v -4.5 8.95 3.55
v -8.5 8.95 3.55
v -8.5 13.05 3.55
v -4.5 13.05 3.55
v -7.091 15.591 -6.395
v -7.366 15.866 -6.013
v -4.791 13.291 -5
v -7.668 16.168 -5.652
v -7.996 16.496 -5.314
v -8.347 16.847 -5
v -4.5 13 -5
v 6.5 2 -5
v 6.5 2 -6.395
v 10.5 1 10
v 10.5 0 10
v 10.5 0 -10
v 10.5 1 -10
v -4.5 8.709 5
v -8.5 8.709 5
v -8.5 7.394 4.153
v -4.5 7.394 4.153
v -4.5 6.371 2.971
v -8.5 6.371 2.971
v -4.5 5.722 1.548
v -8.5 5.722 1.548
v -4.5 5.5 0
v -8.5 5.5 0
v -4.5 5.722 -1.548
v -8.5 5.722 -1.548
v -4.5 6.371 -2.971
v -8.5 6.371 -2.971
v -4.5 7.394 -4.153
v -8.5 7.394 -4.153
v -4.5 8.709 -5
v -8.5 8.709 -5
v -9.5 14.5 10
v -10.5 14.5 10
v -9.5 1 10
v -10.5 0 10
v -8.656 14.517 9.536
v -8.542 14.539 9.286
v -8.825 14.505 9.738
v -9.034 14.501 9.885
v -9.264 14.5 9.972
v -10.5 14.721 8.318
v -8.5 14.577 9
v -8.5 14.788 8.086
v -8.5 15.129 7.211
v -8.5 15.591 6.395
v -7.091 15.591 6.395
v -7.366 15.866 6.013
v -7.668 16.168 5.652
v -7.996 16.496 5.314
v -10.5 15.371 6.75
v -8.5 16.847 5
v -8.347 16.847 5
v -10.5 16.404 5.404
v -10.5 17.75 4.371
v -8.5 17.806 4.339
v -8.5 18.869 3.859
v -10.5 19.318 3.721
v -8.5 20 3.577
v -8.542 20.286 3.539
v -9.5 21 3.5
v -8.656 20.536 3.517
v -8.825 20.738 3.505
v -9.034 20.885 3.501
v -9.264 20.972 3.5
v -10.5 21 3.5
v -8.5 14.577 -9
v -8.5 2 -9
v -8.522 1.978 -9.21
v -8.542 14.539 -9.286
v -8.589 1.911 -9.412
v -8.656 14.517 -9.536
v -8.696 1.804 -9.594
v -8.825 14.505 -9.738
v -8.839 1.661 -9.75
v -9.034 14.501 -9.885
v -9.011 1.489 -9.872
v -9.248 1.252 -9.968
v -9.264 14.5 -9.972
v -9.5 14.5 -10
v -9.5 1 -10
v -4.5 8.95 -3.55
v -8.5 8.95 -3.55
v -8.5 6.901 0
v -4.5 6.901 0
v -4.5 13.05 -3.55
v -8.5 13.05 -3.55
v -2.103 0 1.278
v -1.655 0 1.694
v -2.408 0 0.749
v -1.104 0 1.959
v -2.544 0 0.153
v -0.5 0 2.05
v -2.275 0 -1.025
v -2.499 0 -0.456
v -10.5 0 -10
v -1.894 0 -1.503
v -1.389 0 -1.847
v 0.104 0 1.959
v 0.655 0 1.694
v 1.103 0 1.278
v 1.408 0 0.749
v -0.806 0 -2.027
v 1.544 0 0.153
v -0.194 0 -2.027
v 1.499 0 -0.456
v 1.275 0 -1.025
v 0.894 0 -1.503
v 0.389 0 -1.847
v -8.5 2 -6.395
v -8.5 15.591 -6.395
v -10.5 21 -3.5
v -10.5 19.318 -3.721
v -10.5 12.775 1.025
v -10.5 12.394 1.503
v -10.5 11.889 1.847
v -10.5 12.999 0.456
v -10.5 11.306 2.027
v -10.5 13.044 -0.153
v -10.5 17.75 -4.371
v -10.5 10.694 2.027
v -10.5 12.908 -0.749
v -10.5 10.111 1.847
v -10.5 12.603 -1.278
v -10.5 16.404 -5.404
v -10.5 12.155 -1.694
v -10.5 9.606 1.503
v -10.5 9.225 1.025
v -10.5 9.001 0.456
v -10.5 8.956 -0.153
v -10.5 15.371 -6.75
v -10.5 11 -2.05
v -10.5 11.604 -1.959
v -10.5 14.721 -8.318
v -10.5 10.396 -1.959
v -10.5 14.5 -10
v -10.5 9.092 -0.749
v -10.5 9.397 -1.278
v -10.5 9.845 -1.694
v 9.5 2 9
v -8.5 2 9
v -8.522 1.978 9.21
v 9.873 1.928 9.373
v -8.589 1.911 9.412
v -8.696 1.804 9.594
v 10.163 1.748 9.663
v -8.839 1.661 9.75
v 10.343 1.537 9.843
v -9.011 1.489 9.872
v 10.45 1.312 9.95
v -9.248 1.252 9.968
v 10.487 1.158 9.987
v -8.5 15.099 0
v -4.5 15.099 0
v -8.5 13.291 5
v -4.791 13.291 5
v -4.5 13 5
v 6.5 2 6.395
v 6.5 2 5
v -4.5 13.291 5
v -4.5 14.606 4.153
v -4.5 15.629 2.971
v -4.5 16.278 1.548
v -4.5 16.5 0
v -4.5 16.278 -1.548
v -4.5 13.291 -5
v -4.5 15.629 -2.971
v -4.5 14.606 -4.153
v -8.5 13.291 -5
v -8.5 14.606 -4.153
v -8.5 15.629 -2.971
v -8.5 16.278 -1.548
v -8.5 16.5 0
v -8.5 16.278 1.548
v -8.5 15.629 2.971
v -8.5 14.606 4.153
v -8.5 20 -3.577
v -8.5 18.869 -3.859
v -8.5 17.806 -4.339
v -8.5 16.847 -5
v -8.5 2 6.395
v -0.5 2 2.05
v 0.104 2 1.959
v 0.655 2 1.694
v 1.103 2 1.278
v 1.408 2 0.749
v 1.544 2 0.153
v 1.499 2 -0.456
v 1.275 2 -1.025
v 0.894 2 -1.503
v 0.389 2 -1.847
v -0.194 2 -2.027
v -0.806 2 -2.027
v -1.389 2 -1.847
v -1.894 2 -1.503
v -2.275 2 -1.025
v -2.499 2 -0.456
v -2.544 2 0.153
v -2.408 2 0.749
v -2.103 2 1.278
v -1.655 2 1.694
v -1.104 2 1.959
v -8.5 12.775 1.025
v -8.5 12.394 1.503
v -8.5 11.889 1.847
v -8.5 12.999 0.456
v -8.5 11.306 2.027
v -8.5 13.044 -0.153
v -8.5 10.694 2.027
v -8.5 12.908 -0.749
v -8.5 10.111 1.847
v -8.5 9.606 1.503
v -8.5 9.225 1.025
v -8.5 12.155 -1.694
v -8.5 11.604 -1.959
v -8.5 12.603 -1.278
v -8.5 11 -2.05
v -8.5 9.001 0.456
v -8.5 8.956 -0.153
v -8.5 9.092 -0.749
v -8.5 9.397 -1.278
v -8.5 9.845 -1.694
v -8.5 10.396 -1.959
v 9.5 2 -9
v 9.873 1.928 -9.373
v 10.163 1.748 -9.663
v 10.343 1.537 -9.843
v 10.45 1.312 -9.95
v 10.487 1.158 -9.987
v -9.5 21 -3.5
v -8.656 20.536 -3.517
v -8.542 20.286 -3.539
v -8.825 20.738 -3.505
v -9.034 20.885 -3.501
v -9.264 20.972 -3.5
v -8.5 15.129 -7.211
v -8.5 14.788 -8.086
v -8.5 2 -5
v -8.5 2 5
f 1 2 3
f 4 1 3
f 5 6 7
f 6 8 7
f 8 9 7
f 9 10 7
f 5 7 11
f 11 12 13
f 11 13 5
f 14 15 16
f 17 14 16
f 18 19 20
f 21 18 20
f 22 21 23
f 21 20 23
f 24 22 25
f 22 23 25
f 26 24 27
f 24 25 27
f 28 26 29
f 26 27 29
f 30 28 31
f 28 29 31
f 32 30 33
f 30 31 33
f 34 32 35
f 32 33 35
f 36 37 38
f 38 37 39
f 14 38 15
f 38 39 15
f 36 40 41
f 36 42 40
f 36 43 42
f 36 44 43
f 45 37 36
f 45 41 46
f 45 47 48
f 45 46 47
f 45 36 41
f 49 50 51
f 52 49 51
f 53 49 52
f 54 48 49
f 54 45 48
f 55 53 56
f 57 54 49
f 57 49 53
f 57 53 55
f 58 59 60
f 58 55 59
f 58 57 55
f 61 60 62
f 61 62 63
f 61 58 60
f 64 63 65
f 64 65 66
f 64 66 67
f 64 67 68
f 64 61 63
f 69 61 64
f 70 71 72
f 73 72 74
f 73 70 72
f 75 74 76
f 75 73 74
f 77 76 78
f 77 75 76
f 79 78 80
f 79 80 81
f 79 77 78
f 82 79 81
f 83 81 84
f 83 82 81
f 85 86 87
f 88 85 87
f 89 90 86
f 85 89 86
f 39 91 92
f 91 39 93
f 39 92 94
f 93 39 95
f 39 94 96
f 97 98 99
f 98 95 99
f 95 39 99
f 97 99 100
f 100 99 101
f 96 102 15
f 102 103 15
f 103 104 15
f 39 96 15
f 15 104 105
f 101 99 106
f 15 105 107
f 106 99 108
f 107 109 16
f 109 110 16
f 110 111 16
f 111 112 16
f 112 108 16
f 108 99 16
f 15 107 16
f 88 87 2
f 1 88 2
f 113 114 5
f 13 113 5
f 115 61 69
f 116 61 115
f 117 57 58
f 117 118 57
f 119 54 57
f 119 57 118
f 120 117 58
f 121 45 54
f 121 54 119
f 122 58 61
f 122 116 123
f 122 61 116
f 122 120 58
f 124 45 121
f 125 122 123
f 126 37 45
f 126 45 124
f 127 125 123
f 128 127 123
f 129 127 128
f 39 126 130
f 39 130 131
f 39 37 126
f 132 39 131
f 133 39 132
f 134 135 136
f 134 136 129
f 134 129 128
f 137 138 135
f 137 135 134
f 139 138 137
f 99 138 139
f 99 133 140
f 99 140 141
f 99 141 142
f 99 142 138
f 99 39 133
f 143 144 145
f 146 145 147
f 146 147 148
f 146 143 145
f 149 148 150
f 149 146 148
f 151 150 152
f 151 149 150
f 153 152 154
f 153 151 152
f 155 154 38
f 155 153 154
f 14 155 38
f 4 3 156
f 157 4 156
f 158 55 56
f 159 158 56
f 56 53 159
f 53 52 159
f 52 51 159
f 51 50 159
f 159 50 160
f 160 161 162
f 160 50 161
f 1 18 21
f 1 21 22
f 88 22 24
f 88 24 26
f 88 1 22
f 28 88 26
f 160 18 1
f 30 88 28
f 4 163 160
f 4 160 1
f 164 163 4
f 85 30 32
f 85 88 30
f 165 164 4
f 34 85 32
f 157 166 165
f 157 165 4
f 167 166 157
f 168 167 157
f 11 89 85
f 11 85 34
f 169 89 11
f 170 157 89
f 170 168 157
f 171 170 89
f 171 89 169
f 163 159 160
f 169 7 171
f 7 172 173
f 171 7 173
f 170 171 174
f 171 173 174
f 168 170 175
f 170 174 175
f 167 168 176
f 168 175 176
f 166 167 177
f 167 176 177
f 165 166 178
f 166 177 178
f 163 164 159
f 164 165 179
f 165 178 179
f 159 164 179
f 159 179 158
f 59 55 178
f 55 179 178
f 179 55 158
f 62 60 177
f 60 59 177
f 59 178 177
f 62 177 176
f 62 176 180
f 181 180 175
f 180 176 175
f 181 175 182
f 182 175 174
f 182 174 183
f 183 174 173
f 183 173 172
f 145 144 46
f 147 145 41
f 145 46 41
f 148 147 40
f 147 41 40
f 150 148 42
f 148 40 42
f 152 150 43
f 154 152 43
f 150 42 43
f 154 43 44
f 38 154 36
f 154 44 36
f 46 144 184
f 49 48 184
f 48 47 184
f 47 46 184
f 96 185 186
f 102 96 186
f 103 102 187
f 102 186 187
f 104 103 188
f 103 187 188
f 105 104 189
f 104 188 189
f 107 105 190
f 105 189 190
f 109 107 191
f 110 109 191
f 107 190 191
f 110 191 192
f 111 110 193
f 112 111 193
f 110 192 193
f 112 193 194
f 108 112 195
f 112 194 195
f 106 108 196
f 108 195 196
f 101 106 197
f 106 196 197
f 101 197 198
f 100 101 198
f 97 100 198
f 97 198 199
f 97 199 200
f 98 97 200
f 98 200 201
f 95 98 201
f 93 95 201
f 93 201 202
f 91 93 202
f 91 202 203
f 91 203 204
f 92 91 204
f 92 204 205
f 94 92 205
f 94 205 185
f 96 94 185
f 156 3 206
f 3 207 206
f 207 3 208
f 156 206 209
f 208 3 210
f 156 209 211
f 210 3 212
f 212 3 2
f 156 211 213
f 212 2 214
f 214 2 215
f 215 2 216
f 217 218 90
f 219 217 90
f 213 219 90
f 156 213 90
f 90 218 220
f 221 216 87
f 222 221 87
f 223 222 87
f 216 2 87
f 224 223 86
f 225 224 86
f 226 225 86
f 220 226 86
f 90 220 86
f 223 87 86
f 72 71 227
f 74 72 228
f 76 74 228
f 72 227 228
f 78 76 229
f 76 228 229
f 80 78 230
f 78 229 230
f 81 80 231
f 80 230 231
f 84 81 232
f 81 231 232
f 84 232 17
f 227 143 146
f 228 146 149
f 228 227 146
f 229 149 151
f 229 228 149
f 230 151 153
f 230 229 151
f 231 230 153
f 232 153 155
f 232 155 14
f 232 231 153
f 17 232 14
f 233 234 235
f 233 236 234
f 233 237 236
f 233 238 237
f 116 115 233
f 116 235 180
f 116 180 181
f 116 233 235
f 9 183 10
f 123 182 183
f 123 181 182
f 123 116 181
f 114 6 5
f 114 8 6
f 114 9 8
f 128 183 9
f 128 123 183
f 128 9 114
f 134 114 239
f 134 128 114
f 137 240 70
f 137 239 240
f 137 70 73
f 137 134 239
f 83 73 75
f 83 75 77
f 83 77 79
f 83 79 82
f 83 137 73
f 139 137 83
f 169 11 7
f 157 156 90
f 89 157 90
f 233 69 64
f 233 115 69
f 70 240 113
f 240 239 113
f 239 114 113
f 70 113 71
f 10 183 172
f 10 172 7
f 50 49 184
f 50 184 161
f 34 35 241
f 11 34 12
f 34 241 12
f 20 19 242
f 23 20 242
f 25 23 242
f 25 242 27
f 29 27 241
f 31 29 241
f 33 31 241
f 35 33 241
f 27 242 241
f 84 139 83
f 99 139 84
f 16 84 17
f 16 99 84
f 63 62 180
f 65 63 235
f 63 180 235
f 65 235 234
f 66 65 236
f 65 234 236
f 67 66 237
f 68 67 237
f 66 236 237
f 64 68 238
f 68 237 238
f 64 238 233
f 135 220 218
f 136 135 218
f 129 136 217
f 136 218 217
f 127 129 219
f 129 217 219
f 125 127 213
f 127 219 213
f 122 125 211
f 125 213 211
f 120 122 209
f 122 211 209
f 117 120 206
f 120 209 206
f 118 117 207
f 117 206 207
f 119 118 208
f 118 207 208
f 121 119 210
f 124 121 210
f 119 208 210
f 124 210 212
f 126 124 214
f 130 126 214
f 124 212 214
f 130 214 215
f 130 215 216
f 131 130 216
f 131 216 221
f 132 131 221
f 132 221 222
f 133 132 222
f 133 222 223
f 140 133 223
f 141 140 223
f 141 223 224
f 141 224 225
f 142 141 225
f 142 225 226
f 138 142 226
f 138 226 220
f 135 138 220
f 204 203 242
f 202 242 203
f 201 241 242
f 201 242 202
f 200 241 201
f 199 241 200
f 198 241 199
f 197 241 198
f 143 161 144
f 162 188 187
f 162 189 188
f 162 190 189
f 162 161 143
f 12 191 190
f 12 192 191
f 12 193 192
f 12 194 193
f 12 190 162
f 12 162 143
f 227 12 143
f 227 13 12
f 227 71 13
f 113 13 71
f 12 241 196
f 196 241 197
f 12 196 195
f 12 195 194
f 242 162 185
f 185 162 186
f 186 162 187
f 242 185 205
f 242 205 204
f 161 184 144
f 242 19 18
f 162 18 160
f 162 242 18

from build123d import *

# Parameters (mm, degrees)
ESQUISSE1_W                  = 21
ESQUISSE1_H                  = 20
BOSS_EXTRU_1_DEPTH           = 2
ESQUISSE2_W                  = 2
ESQUISSE2_H                  = 20
BOSS_EXTRU_2_DEPTH           = 19
ESQUISSE3_R                  = 2.05
ENL_V_MAT_EXTRU_1_DEPTH      = 20
ESQUISSE4_R                  = 2.05
ENL_V_MAT_EXTRU_2_DEPTH      = 20
ESQUISSE5_W                  = 15
ESQUISSE5_H                  = 1.39480656
BOSS_EXTRU_3_DEPTH           = 15
CHANFREIN1_SIZE              = 15
CONG_1_R                     = 1
BOSS_EXTRU_12_DEPTH          = 4
ENL_V_MAT_EXTRU_3_DEPTH      = 26.51960031
ENL_V_MAT_EXTRU_3_DEPTH_BACK = 26.51960031
ESQUISSE9_R                  = 6.5


with BuildPart() as part:
    # Esquisse1 → Boss.-Extru.1 (new body)
    with BuildSketch(Plane(origin=(0, 0, 0), x_dir=(1, 0, 0), z_dir=(0, 1, 0))):
        Rectangle(ESQUISSE1_W, ESQUISSE1_H)
    extrude(amount=BOSS_EXTRU_1_DEPTH)

    # Esquisse2 → Boss.-Extru.2 (add)
    with BuildSketch(Plane(origin=(0, 2, 0), x_dir=(1, 0, 0), z_dir=(0, 1, 0))):
        with Locations((-9.5, 0)):
            Rectangle(ESQUISSE2_W, ESQUISSE2_H)
    extrude(amount=BOSS_EXTRU_2_DEPTH)

    # Esquisse3 → Enlèv. mat.-Extru.1 (cut)
    with BuildSketch(Plane(origin=(0, 2, 0), x_dir=(1, 0, 0), z_dir=(0, 1, 0))):
        with Locations(Location((-0.5, 0, 0), (0, 0, 270))):
            Circle(ESQUISSE3_R)
    extrude(amount=-ENL_V_MAT_EXTRU_1_DEPTH, mode=Mode.SUBTRACT)

    # Esquisse4 → Enlèv. mat.-Extru.2 (cut)
    with BuildSketch(Plane(origin=(-8.5, 0, 0), x_dir=(0, 0, -1), z_dir=(1, 0, 0))):
        with Locations((0, 11)):
            Circle(ESQUISSE4_R)
    extrude(amount=-ENL_V_MAT_EXTRU_2_DEPTH, mode=Mode.SUBTRACT)

    # Esquisse5 → Boss.-Extru.3 (add)
    with BuildSketch(Plane(origin=(0, 2, 0), x_dir=(1, 0, 0), z_dir=(0, 1, 0))):
        with Locations((-1, -5.69740328)):
            Rectangle(ESQUISSE5_W, ESQUISSE5_H)
        with Locations((-1, 5.69740328)):
            Rectangle(ESQUISSE5_W, ESQUISSE5_H)
    extrude(amount=BOSS_EXTRU_3_DEPTH)

    # Chanfrein1
    chanfrein1_edges = [part.edges().sort_by_distance(p)[0] for p in [
        (6.5, 17, 5.69740328),
        (6.5, 17, -5.69740328),
    ]]
    chamfer(chanfrein1_edges, length=CHANFREIN1_SIZE - 0.0001)  # a hair under: the kernel refuses the full size

    # Congé1
    cong_1_edges = [part.edges().sort_by_distance(p)[0] for p in [
        (10.5, 2, 0),
        (1, 2, 10),
        (-8.5, 21, 0),
        (-8.5, 11.5, 10),
        (-8.5, 11.5, -10),
        (1, 2, -10),
    ]]
    fillet(cong_1_edges, radius=CONG_1_R)

    # Esquisse7 → Boss.-Extru.12 (add)
    with BuildSketch(Plane(origin=(-8.5, 0, 0), x_dir=(0, 0, -1), z_dir=(1, 0, 0))):
        with BuildLine():
            Line((5, 8.708712153), (5, 13.291287847))
            ThreePointArc((5, 13.291287847), (0, 16.5), (-5, 13.291287847))
            Line((-5, 13.291287847), (-5, 8.708712153))
            ThreePointArc((-5, 8.708712153), (0, 5.5), (5, 8.708712153))
        make_face()
        Polygon((3.55, 8.950406544), (0, 6.900813089), (-3.55, 8.950406544), (-3.55, 13.049593456), (0, 15.099186911), (3.55, 13.049593456), align=None, mode=Mode.SUBTRACT)
    extrude(amount=BOSS_EXTRU_12_DEPTH)

    # Esquisse9 → Enlèv. mat.-Extru.3 (cut, two sides: drawn at the far end of the back side and taken through both)
    with BuildSketch(Plane(origin=(0, 0, 0), x_dir=(0, 0, -1), z_dir=(1, 0, 0)).offset(-ENL_V_MAT_EXTRU_3_DEPTH_BACK)):
        with Locations((-10, 21)):
            Circle(ESQUISSE9_R)
        with Locations((10, 21)):
            Circle(ESQUISSE9_R)
    extrude(amount=ENL_V_MAT_EXTRU_3_DEPTH + ENL_V_MAT_EXTRU_3_DEPTH_BACK, mode=Mode.SUBTRACT)


solid = part.part
